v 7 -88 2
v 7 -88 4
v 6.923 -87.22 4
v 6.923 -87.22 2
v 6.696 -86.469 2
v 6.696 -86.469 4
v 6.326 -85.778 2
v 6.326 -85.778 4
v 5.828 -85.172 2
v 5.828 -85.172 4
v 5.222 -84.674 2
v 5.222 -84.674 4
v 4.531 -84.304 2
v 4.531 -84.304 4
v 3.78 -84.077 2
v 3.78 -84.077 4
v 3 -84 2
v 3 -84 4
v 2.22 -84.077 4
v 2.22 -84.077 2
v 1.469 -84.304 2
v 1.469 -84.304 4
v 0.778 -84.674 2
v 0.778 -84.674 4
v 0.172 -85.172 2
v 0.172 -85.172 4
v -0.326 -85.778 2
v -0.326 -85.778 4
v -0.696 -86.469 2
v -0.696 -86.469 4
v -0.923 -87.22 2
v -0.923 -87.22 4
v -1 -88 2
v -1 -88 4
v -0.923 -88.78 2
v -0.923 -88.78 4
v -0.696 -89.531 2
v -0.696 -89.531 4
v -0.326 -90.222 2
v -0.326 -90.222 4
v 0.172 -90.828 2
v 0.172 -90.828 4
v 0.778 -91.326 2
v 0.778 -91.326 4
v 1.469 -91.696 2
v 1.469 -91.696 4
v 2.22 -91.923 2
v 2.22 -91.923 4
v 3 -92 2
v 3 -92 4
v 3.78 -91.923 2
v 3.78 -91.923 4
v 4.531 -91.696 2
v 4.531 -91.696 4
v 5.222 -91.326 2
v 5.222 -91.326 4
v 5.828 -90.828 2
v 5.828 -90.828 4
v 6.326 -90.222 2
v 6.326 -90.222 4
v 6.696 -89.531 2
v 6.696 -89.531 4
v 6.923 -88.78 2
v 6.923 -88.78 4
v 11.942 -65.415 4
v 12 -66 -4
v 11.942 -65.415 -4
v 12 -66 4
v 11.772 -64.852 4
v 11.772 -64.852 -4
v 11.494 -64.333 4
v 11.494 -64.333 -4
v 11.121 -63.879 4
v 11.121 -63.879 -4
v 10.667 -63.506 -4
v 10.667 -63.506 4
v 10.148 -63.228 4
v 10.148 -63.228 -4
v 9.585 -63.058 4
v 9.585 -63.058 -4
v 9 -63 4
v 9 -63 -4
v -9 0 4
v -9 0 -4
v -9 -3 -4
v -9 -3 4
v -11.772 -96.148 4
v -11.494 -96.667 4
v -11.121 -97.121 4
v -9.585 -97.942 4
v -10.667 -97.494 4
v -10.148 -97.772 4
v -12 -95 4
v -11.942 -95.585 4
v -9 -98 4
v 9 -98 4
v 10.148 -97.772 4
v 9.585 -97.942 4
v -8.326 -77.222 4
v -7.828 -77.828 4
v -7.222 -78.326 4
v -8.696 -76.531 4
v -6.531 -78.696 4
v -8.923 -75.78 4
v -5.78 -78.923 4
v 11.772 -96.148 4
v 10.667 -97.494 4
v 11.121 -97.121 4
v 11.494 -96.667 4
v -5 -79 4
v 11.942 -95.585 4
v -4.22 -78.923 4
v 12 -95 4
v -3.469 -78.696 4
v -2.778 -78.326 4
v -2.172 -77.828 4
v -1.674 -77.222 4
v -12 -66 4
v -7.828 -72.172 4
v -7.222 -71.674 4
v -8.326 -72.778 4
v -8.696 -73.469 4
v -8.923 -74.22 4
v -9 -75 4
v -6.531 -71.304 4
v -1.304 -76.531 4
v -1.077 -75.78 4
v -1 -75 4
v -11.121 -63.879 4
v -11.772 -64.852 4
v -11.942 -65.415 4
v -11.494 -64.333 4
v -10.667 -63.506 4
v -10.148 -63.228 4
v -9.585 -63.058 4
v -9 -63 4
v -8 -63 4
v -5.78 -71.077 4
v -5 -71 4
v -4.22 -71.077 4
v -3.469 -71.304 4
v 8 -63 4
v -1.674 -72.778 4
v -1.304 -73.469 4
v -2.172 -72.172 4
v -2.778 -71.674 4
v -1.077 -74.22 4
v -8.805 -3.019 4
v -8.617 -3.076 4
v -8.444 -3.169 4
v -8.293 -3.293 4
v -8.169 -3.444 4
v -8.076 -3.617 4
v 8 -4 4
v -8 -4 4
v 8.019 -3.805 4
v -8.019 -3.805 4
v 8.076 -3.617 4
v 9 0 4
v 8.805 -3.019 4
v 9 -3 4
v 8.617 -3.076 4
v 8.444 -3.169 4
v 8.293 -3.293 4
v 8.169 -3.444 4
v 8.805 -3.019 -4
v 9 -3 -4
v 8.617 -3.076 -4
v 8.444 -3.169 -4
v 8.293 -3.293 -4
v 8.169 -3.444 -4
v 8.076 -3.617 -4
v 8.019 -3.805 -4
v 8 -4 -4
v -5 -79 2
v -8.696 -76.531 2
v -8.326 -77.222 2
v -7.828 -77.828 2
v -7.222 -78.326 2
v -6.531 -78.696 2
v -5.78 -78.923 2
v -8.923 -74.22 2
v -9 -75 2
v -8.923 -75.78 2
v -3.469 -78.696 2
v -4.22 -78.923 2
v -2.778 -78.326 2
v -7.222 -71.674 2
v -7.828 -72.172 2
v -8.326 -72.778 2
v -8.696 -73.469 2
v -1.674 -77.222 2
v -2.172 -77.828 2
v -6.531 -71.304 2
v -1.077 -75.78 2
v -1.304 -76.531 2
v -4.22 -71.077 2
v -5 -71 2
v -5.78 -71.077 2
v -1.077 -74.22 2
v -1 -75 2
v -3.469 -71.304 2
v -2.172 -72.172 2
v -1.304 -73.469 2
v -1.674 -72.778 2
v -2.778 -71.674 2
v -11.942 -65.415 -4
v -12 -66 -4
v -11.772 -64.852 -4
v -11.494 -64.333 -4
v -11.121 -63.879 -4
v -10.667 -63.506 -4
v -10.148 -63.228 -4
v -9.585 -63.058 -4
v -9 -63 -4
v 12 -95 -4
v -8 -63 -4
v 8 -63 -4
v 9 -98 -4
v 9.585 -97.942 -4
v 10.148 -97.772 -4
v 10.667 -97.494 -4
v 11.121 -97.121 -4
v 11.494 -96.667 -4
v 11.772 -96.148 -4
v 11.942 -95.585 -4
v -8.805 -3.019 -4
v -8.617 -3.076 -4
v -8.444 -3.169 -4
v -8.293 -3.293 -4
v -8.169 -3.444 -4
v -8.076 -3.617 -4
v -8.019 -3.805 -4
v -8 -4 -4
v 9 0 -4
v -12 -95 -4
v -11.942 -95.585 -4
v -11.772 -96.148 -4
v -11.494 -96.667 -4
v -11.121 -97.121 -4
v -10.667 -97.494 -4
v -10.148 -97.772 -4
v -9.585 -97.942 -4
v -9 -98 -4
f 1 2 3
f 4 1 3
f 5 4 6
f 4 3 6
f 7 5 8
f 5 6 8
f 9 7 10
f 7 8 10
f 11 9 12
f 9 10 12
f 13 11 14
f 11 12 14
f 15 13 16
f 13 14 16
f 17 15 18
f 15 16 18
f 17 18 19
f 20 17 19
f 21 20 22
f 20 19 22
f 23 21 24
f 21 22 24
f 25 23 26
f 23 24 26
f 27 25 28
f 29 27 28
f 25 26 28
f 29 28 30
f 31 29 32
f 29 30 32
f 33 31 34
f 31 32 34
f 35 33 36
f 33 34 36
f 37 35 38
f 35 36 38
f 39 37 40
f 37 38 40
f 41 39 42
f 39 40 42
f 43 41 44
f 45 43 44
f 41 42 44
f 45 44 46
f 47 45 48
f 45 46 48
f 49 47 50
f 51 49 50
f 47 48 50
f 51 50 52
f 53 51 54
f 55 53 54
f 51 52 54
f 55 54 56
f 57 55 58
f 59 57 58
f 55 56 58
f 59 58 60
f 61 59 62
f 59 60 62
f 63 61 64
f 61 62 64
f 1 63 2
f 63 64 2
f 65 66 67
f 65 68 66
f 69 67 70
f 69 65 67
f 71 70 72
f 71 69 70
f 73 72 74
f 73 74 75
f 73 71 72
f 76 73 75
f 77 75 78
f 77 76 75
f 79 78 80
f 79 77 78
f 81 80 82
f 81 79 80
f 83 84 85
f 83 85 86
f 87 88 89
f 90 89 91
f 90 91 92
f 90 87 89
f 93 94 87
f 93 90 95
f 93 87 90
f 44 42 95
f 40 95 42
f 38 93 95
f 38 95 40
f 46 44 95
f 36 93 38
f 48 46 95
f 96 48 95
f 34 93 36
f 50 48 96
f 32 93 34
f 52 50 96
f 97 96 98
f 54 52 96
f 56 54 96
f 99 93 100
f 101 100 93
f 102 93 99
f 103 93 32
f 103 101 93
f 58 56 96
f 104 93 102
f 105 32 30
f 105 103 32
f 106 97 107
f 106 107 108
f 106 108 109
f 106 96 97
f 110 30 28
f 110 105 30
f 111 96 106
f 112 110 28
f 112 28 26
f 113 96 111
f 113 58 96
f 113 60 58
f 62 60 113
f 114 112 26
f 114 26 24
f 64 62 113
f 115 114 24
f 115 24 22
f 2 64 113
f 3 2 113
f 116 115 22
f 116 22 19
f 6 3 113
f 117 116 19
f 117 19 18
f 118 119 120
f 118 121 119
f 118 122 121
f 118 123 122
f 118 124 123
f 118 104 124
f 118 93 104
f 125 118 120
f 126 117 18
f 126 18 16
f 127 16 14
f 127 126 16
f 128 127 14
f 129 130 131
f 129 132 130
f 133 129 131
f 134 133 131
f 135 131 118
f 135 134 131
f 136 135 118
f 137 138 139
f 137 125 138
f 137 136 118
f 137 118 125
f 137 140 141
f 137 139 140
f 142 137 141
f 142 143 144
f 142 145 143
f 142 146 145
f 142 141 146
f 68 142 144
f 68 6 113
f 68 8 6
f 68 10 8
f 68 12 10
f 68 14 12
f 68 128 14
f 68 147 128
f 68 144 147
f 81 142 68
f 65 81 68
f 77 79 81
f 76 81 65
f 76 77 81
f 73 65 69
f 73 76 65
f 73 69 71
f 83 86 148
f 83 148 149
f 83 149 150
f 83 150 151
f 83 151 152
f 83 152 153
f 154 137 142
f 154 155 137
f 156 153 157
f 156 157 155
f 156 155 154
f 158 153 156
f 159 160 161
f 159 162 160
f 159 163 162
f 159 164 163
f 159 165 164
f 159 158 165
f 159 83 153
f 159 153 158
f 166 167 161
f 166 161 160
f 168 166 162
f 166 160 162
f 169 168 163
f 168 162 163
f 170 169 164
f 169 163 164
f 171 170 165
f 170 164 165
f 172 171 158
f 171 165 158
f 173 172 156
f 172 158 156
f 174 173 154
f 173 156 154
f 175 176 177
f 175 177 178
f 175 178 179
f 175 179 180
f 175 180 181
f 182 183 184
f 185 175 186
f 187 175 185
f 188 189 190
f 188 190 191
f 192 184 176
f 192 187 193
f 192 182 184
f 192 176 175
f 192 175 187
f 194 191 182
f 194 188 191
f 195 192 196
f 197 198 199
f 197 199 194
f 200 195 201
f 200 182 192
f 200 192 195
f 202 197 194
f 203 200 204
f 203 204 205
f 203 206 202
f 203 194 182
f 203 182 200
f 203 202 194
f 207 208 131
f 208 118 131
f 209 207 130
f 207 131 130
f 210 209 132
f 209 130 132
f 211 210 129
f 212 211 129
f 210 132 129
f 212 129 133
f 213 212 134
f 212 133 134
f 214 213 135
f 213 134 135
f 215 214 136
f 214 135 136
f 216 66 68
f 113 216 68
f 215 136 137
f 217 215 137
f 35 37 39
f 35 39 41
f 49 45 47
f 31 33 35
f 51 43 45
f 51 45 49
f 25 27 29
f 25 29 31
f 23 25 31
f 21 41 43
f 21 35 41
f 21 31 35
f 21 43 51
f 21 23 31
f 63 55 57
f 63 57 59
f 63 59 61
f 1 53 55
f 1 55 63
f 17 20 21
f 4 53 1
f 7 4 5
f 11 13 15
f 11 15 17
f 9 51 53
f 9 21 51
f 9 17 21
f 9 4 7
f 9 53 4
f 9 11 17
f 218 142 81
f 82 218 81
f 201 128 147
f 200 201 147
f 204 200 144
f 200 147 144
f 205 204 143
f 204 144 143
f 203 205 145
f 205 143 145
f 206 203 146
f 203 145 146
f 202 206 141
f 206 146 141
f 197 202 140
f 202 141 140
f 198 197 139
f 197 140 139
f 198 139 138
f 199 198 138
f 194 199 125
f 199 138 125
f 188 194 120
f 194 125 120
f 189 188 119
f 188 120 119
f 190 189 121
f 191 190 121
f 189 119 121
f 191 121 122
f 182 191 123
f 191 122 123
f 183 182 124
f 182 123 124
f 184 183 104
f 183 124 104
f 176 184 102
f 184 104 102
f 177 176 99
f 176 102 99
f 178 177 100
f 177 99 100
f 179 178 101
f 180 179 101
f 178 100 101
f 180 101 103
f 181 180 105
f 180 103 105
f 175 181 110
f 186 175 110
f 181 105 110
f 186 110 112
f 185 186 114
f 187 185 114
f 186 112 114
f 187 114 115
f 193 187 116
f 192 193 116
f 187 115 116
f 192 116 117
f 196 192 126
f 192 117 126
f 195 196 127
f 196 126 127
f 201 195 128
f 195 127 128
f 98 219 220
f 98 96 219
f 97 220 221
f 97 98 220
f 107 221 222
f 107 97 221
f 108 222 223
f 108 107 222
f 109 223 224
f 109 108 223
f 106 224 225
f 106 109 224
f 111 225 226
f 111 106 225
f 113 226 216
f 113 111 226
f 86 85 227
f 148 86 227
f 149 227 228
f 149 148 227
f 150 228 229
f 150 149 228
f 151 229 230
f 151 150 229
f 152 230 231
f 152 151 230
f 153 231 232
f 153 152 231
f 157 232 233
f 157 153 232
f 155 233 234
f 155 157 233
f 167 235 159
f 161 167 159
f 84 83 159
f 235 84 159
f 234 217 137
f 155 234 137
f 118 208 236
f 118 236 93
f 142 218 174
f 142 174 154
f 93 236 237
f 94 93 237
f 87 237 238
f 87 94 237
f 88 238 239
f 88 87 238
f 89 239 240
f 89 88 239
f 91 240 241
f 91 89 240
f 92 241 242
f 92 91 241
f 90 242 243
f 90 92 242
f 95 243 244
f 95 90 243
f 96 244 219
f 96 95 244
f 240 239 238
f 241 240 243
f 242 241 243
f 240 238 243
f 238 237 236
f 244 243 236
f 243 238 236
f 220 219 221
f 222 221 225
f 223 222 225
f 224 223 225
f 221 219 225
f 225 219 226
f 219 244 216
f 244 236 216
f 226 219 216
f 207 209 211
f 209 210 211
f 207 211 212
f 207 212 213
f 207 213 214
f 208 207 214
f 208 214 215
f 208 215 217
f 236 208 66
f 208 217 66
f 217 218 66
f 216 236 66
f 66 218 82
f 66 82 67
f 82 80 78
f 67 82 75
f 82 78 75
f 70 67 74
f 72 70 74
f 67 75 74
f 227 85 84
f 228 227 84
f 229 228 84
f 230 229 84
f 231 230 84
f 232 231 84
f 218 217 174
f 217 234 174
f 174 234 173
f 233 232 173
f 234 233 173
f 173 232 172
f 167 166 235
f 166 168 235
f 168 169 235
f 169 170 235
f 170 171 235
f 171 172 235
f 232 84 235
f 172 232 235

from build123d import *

# Parameters (mm, degrees)
F0_W     = 18
F0_H     = 8
F1_DEPTH = 3
F2_W     = 16
F2_H     = 8
F3_DEPTH = 60
F4_R     = 0.99999
F5_W     = 24
F5_H     = 8
F6_DEPTH = 35
F7_R     = 3
F8_R     = 4
F9_DEPTH = 2


# Not quite as in the source:
# - a fillet or chamfer is up to 0.001 mm smaller than in the source, because OpenCascade refuses the exact size


with BuildPart() as f1:
    # F0 (on Front) → F1 (new body)
    with BuildSketch(Plane.XZ):
        Rectangle(F0_W, F0_H)
    extrude(amount=F1_DEPTH)

    # F2 (on face) → F3 (join)
    with BuildSketch(Plane.XZ.offset(3)):
        Rectangle(F2_W, F2_H)
    extrude(amount=F3_DEPTH)

    # F4 (radius 1 in the source; OpenCascade refuses exactly that, so slightly less here)
    f4_edges = [f1.edges().sort_by_distance(p)[0] for p in [
        (-8, -3, 0),
        (8, -3, 0),
    ]]
    fillet(f4_edges, radius=F4_R)

    # F5 (on face) → F6 (join)
    with BuildSketch(Plane.XZ.offset(63)):
        Rectangle(F5_W, F5_H)
    extrude(amount=F6_DEPTH)

    # F7
    f7_edges = [f1.edges().sort_by_distance(p)[0] for p in [
        (-12, -63, 0),
        (-12, -98, 0),
        (12, -98, 0),
        (12, -63, 0),
    ]]
    fillet(f7_edges, radius=F7_R)

    # F8 (on face) → F9 (cut)
    with BuildSketch(Plane.XY.offset(4)):
        with Locations((-5, -75)):
            Circle(F8_R)
        with Locations((3, -88)):
            Circle(F8_R)
    extrude(amount=-F9_DEPTH, mode=Mode.SUBTRACT)


solid = f1.part
